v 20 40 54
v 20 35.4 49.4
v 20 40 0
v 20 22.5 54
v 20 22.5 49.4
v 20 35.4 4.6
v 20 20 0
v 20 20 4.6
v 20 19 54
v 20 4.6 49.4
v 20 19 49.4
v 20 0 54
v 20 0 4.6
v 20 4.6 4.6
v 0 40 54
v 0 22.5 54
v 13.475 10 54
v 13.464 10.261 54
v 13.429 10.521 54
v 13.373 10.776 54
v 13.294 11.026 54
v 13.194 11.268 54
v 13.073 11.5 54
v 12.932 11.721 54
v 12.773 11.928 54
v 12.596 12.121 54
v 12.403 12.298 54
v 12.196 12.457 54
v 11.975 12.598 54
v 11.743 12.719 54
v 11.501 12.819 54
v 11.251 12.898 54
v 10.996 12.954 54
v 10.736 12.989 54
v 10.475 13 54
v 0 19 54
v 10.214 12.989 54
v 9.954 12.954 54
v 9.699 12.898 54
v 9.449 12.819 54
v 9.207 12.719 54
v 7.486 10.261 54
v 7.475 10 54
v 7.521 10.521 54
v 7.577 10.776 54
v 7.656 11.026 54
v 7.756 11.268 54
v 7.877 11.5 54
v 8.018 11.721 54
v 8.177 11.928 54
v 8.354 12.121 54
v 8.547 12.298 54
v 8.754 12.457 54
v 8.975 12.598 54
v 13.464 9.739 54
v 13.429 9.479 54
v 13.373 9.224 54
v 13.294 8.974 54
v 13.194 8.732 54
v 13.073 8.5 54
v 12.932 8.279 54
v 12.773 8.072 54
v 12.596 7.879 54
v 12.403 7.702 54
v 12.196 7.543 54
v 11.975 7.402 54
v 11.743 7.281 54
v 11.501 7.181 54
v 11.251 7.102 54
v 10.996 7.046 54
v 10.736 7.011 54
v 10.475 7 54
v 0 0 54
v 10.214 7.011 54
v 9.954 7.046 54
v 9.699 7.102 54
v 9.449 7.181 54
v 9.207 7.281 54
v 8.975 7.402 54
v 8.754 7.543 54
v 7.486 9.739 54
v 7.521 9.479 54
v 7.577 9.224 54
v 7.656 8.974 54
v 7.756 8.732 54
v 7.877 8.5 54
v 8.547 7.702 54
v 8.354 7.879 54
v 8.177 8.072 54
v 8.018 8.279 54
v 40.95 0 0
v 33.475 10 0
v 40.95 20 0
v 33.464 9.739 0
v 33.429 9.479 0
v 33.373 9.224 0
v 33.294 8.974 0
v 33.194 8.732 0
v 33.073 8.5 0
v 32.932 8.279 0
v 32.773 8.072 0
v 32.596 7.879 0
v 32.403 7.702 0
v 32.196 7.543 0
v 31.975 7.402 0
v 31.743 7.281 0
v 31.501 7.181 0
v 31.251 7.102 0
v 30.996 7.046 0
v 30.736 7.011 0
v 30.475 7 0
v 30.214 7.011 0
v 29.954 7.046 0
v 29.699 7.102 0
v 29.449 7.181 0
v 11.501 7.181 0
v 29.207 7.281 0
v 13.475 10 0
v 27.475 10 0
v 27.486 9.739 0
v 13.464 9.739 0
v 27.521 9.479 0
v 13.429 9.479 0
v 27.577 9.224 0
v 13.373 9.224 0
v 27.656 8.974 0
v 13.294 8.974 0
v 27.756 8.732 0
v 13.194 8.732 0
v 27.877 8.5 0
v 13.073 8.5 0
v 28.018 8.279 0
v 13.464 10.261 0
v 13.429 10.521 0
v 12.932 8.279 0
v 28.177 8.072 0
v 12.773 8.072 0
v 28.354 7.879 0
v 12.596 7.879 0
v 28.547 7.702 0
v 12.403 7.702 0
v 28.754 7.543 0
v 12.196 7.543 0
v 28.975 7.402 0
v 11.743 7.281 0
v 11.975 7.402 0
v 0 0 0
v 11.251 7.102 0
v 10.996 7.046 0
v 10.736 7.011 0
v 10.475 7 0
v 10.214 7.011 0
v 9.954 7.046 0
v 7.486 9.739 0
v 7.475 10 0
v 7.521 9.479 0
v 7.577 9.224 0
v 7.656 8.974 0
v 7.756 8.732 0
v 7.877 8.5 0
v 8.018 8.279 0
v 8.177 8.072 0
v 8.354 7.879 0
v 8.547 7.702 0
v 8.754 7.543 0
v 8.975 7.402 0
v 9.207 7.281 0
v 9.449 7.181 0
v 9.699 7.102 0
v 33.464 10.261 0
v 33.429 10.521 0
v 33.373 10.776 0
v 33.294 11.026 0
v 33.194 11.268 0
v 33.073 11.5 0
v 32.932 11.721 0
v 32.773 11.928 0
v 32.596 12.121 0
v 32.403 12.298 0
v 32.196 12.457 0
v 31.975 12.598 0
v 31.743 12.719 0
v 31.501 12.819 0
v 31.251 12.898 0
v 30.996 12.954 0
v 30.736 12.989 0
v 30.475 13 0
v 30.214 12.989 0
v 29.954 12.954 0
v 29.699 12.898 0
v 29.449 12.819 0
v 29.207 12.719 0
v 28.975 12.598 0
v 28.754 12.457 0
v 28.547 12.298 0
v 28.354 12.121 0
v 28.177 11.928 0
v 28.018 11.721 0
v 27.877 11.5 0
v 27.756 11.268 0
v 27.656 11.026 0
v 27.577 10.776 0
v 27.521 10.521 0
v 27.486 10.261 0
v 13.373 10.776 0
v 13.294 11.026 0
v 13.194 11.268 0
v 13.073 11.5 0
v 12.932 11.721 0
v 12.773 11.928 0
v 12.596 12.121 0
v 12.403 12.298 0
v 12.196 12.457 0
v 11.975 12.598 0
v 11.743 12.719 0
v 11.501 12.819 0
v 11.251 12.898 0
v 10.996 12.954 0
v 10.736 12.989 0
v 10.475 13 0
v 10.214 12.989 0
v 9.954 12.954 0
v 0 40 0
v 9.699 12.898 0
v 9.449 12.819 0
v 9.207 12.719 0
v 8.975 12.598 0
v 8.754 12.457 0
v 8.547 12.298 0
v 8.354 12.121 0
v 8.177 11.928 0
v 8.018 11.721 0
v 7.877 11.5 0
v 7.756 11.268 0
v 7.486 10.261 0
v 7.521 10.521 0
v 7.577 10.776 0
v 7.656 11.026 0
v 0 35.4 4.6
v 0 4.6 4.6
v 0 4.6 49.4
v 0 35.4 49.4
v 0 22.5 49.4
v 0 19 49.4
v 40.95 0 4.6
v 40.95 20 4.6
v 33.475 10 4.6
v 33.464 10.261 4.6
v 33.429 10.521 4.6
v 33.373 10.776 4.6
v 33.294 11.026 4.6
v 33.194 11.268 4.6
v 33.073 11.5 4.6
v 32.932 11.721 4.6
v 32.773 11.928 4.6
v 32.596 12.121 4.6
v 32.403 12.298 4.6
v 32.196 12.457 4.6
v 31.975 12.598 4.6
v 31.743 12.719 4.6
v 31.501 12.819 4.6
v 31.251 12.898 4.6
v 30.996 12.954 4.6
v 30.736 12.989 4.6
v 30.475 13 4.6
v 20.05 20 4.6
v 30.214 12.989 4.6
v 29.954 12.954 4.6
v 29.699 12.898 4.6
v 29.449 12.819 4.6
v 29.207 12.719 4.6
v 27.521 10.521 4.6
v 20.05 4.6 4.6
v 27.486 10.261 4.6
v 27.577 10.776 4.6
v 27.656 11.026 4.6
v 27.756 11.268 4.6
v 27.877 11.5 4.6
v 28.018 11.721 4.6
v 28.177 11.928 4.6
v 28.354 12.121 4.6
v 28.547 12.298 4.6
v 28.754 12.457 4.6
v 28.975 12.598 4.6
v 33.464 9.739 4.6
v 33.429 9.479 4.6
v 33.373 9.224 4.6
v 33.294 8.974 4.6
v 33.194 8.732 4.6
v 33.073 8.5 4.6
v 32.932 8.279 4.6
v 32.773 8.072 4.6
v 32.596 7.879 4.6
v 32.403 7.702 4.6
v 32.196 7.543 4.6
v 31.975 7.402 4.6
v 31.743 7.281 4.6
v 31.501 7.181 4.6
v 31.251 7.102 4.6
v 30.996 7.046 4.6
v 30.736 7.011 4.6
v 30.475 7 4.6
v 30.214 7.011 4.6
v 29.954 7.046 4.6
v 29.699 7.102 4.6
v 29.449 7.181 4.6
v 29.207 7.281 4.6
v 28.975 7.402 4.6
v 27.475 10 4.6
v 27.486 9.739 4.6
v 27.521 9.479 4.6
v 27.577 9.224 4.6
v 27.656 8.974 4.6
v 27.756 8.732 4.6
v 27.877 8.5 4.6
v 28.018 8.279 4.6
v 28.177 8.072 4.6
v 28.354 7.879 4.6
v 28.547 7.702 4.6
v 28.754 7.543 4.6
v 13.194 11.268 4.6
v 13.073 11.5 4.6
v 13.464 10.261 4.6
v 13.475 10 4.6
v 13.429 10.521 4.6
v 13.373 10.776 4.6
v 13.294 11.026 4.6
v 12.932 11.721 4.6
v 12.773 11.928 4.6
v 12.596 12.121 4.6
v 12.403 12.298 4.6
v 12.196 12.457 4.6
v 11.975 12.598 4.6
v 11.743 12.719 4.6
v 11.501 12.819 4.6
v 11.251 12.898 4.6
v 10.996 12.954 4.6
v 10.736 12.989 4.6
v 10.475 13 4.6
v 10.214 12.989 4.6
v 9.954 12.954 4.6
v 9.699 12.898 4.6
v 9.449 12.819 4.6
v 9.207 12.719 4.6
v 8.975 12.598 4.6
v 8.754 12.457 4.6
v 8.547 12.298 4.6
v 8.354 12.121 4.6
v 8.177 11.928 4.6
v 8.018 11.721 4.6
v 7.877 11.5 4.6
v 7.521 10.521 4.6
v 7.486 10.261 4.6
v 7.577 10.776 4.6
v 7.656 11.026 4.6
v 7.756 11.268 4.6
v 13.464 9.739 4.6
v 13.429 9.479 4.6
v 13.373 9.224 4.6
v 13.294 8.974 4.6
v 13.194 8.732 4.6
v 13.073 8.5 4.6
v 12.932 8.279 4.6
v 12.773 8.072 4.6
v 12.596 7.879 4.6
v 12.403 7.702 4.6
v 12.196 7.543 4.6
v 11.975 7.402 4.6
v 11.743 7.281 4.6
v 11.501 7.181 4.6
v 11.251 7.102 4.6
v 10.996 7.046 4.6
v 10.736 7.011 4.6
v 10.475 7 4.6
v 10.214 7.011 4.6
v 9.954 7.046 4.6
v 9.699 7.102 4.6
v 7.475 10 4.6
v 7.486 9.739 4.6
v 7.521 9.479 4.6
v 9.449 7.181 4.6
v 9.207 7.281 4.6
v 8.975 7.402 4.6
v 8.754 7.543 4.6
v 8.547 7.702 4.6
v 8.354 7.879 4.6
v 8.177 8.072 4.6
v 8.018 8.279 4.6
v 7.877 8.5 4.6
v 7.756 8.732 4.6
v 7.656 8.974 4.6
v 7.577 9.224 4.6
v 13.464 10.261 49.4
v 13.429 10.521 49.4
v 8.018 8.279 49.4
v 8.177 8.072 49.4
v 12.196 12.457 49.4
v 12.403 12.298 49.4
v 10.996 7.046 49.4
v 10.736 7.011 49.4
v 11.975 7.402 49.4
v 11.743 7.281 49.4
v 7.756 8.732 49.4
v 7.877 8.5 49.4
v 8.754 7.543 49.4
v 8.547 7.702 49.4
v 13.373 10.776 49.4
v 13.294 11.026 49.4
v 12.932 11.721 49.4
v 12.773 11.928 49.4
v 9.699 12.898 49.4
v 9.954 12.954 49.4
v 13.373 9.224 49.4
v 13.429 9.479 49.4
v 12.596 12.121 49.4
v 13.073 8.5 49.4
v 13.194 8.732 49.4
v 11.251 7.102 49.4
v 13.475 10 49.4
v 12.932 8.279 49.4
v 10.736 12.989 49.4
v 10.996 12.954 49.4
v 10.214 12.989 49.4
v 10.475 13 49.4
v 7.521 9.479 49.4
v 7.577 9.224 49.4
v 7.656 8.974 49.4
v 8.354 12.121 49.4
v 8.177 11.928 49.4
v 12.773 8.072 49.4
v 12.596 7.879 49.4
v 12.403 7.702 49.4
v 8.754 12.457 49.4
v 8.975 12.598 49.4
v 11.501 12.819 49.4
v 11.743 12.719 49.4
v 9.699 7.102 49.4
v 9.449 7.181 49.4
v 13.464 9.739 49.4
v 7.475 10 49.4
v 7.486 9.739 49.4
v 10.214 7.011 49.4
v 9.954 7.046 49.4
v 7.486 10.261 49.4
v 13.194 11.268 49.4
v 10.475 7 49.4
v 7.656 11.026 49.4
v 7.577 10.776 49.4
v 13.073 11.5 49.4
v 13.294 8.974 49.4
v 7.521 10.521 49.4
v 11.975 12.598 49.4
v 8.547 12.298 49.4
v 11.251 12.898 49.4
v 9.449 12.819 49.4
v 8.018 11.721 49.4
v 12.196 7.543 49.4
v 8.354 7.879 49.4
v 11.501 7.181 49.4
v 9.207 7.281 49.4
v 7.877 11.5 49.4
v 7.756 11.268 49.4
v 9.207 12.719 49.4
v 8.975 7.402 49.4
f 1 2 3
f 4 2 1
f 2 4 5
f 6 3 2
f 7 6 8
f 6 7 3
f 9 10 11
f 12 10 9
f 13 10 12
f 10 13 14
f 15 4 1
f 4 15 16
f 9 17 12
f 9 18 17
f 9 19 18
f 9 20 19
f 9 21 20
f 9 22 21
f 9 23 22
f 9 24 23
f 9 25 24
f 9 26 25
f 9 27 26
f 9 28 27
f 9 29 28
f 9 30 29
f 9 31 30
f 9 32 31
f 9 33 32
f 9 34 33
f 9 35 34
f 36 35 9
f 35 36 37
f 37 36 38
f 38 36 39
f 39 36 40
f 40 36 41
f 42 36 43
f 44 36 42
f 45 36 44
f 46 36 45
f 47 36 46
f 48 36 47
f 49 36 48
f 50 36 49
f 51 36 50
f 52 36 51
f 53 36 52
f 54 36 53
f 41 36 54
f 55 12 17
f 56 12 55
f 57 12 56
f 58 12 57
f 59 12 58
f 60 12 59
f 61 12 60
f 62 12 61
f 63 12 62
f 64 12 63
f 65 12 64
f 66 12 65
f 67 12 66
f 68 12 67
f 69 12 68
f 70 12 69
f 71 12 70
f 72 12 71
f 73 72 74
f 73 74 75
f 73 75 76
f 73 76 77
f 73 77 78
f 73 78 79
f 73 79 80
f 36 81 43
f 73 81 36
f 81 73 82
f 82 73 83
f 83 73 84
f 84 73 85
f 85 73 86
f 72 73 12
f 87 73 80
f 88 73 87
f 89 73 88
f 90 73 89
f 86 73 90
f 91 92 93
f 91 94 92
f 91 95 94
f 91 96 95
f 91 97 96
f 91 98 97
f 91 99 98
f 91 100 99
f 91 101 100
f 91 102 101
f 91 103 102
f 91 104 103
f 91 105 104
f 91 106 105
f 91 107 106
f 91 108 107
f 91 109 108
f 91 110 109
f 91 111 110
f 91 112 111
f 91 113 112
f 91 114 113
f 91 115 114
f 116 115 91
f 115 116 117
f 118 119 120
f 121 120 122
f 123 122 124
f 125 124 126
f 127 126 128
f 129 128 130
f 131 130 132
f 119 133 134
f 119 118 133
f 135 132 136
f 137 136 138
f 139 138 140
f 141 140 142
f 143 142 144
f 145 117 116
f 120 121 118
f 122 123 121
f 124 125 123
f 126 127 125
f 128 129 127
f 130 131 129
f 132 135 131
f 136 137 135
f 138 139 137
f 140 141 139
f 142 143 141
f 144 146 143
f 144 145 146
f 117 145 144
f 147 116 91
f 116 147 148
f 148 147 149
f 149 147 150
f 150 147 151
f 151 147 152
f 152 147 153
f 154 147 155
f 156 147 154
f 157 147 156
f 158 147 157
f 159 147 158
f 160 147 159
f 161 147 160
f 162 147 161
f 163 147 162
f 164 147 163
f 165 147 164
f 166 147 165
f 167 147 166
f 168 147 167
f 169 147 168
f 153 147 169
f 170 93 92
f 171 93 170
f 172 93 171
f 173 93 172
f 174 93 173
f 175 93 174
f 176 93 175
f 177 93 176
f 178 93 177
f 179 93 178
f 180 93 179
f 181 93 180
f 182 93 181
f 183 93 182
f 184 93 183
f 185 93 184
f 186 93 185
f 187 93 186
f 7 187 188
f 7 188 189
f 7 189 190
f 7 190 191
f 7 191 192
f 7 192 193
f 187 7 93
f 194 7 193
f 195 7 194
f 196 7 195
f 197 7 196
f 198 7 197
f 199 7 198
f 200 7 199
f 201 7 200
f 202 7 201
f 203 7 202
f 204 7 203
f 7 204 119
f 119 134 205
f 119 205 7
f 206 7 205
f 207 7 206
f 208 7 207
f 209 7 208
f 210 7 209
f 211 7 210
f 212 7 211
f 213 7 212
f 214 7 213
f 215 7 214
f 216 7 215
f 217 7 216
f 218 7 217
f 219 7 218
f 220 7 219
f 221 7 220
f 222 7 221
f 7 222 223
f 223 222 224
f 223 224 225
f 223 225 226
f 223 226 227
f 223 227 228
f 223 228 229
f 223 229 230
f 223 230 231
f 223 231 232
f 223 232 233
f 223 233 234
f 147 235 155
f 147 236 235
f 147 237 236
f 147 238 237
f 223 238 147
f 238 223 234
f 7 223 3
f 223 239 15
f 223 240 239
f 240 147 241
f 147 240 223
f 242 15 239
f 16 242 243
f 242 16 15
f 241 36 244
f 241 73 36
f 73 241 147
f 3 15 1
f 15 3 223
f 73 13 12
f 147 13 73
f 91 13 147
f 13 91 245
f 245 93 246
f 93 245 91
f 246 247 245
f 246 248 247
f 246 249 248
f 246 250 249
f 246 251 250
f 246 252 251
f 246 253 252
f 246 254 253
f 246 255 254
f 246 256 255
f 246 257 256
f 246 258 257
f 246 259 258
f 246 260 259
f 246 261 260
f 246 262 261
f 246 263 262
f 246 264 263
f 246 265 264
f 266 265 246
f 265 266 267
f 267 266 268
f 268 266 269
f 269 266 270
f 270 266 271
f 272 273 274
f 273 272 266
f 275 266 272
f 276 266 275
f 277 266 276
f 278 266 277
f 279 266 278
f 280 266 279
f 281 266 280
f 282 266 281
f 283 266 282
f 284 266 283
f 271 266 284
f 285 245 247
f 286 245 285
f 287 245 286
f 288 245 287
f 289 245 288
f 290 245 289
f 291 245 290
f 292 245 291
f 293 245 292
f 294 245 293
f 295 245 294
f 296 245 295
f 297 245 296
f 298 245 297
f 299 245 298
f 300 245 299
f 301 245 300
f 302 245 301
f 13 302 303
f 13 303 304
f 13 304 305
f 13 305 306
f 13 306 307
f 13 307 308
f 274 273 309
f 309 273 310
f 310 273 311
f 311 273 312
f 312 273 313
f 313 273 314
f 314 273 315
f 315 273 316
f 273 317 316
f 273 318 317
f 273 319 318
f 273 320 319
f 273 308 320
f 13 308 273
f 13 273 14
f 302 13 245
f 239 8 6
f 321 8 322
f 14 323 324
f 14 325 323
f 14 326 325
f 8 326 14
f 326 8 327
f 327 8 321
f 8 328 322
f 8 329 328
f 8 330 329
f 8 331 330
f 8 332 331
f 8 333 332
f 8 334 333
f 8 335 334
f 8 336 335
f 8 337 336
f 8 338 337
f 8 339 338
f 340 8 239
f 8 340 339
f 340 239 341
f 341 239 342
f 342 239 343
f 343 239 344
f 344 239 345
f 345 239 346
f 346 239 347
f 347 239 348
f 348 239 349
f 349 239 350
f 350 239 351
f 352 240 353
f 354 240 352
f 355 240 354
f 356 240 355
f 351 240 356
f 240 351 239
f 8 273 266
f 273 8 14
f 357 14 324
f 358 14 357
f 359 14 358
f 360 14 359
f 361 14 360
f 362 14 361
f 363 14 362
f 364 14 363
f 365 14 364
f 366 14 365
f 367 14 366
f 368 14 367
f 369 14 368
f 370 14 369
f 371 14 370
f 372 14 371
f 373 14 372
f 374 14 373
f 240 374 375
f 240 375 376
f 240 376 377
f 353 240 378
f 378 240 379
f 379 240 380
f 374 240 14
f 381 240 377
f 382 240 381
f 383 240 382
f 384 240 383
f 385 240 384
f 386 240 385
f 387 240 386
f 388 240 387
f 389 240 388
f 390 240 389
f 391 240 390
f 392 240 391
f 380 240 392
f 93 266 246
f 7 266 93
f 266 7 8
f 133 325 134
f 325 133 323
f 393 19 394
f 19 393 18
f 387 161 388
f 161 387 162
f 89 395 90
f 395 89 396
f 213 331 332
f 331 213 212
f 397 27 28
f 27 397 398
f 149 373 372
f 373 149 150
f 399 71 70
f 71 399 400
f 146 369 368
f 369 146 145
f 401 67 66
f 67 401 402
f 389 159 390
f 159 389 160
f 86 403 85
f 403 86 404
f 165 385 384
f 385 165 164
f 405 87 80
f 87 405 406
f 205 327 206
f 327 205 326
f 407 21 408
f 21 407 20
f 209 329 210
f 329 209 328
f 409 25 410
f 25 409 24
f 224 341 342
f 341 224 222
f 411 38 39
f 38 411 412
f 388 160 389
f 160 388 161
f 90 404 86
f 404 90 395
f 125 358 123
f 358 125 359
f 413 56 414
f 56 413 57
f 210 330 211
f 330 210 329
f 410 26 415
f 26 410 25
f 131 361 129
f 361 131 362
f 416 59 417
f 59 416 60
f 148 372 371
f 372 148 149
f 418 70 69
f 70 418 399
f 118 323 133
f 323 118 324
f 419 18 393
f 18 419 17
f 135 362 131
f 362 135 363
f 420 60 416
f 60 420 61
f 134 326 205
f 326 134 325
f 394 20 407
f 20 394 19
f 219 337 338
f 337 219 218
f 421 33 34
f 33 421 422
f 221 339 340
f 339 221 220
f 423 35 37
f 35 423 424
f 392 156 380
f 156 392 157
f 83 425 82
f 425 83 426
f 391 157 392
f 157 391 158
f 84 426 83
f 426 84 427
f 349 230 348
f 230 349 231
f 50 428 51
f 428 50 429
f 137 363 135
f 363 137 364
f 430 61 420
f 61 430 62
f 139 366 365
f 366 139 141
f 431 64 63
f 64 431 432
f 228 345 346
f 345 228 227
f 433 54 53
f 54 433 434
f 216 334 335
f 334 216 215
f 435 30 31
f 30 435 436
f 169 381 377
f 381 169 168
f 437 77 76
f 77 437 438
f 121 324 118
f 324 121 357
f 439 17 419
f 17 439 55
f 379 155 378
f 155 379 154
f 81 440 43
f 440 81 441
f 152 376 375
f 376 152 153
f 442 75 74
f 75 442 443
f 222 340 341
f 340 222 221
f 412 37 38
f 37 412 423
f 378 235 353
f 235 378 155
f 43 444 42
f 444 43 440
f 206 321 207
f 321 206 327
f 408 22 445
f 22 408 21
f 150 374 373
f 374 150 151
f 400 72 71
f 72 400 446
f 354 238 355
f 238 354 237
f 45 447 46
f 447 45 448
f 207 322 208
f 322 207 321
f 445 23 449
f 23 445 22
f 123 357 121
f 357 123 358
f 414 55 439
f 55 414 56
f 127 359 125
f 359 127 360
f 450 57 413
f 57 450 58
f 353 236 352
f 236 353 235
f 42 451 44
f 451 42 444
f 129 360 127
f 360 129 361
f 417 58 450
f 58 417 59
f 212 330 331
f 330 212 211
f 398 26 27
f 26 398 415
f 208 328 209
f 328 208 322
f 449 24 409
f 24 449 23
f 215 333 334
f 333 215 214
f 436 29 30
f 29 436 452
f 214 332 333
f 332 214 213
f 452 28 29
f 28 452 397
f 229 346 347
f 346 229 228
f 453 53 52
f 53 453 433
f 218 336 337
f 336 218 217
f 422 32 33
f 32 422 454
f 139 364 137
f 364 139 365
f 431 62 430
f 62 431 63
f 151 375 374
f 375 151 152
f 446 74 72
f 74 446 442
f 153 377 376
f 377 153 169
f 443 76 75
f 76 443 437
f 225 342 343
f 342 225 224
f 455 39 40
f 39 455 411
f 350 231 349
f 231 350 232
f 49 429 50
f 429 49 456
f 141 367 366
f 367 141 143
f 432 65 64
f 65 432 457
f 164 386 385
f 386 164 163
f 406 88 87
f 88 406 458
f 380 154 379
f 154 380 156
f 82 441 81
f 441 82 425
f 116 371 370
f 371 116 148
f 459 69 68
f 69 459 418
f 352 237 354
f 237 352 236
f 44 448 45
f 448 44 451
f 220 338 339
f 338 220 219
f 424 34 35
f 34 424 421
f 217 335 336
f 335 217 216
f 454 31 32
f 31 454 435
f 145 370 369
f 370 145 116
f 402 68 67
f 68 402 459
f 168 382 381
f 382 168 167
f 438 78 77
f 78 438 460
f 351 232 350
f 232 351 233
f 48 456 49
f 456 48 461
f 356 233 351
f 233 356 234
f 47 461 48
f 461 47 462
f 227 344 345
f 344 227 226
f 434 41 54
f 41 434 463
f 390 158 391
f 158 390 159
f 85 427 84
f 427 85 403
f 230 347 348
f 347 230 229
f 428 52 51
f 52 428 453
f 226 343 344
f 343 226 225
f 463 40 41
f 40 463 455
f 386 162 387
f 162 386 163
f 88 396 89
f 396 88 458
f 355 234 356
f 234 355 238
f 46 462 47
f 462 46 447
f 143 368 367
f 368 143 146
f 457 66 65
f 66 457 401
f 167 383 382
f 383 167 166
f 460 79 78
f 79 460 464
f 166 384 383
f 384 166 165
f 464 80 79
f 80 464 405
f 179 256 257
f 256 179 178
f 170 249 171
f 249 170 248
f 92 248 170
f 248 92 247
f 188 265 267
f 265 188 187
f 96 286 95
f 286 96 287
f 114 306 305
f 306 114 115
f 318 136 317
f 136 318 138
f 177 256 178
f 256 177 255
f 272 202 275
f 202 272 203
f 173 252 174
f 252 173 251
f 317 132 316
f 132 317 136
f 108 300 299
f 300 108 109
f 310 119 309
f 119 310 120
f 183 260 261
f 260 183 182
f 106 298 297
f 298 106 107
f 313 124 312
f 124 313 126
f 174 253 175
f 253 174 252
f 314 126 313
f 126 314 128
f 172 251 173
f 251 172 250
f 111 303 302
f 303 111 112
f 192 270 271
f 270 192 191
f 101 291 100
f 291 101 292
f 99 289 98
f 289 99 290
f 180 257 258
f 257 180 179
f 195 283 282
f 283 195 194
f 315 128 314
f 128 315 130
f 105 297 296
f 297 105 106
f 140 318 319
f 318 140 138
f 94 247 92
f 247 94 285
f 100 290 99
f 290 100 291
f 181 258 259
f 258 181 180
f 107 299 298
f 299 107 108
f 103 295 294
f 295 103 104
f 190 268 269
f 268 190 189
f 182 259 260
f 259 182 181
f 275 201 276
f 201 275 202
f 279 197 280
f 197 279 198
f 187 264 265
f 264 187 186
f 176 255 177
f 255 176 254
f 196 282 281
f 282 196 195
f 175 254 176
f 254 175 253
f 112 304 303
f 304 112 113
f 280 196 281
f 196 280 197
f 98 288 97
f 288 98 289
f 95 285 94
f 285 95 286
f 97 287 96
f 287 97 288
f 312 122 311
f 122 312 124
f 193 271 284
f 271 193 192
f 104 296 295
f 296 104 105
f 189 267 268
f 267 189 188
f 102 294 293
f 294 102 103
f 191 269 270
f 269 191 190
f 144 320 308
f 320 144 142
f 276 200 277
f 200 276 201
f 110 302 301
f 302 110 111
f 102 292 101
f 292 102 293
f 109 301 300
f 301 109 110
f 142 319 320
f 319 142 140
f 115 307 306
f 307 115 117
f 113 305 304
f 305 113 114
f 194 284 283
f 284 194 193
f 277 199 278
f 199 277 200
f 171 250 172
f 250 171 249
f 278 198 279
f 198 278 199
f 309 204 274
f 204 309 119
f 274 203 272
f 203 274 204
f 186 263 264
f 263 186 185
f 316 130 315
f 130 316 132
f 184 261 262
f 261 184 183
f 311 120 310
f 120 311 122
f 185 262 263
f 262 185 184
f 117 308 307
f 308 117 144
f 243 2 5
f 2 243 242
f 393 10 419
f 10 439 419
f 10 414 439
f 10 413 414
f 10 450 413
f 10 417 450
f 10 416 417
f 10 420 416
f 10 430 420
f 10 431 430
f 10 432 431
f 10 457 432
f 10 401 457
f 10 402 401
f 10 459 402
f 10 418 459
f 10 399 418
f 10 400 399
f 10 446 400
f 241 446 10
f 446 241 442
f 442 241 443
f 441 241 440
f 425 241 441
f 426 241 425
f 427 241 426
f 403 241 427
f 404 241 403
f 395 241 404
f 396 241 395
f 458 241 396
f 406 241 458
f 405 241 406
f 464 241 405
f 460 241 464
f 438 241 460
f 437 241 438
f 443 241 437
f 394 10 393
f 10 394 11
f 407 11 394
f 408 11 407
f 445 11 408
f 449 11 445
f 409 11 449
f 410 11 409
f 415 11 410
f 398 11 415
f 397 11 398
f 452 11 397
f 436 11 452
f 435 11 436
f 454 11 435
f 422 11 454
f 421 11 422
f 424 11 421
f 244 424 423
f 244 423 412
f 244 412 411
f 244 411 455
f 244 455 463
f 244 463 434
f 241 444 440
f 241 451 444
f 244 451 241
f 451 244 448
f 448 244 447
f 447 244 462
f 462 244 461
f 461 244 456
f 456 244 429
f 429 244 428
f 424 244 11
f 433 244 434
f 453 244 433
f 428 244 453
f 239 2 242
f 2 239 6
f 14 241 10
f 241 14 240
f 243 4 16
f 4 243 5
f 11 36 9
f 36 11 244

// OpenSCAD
/*difference() {
translate([32.5, -3.5-4.8-6.3, 3.0]) import("/home/curly/Downloads/Cable_Guide_90deg_large.stl");
rotate([0, 0, 180])cube(100);
}*/
/* thickness 4.5, 6.3, 19.0 */
/* gap 3.5 */
include <MCAD/units.scad>

$fn = 72;

in = 25.4;
/* pitch = 5/8 * in; */
/* margin = 1/4 * in; */

nut_cutout = 3/8 * in;
plate = 4.6;
eps = 0.1;
thickness = plate;
width = 40;
height = 54;
gap = 3.5;
gap_offset = 19.0;

pitch = 20.0;
margin = (pitch - nut_cutout);
ru = pitch + 2*margin;

difference() {
	union() {
		cube([pitch, width, height]);
		cube([ru, pitch, plate]);
	}
	translate([-eps/2, thickness, thickness]) cube([pitch+eps, width-2*thickness, height-2*thickness]);
	translate([-eps/2, gap_offset, height-thickness-eps/2]) cube([pitch+eps, gap, thickness+eps]);
	translate([margin, pitch/2, (height+plate)/2]) union() {
		cylinder(h=height+plate+2*eps, d=M6, center=true);
		//%cube([13.72, 13.72, plate+eps], center=true);
		translate([pitch, 0, 0]) { 
			cylinder(h=height+plate+2*eps, d=M6,center=true);
			//%cube([13.72, 13.72, plate+eps], center=true);
		}
		
	}
}
